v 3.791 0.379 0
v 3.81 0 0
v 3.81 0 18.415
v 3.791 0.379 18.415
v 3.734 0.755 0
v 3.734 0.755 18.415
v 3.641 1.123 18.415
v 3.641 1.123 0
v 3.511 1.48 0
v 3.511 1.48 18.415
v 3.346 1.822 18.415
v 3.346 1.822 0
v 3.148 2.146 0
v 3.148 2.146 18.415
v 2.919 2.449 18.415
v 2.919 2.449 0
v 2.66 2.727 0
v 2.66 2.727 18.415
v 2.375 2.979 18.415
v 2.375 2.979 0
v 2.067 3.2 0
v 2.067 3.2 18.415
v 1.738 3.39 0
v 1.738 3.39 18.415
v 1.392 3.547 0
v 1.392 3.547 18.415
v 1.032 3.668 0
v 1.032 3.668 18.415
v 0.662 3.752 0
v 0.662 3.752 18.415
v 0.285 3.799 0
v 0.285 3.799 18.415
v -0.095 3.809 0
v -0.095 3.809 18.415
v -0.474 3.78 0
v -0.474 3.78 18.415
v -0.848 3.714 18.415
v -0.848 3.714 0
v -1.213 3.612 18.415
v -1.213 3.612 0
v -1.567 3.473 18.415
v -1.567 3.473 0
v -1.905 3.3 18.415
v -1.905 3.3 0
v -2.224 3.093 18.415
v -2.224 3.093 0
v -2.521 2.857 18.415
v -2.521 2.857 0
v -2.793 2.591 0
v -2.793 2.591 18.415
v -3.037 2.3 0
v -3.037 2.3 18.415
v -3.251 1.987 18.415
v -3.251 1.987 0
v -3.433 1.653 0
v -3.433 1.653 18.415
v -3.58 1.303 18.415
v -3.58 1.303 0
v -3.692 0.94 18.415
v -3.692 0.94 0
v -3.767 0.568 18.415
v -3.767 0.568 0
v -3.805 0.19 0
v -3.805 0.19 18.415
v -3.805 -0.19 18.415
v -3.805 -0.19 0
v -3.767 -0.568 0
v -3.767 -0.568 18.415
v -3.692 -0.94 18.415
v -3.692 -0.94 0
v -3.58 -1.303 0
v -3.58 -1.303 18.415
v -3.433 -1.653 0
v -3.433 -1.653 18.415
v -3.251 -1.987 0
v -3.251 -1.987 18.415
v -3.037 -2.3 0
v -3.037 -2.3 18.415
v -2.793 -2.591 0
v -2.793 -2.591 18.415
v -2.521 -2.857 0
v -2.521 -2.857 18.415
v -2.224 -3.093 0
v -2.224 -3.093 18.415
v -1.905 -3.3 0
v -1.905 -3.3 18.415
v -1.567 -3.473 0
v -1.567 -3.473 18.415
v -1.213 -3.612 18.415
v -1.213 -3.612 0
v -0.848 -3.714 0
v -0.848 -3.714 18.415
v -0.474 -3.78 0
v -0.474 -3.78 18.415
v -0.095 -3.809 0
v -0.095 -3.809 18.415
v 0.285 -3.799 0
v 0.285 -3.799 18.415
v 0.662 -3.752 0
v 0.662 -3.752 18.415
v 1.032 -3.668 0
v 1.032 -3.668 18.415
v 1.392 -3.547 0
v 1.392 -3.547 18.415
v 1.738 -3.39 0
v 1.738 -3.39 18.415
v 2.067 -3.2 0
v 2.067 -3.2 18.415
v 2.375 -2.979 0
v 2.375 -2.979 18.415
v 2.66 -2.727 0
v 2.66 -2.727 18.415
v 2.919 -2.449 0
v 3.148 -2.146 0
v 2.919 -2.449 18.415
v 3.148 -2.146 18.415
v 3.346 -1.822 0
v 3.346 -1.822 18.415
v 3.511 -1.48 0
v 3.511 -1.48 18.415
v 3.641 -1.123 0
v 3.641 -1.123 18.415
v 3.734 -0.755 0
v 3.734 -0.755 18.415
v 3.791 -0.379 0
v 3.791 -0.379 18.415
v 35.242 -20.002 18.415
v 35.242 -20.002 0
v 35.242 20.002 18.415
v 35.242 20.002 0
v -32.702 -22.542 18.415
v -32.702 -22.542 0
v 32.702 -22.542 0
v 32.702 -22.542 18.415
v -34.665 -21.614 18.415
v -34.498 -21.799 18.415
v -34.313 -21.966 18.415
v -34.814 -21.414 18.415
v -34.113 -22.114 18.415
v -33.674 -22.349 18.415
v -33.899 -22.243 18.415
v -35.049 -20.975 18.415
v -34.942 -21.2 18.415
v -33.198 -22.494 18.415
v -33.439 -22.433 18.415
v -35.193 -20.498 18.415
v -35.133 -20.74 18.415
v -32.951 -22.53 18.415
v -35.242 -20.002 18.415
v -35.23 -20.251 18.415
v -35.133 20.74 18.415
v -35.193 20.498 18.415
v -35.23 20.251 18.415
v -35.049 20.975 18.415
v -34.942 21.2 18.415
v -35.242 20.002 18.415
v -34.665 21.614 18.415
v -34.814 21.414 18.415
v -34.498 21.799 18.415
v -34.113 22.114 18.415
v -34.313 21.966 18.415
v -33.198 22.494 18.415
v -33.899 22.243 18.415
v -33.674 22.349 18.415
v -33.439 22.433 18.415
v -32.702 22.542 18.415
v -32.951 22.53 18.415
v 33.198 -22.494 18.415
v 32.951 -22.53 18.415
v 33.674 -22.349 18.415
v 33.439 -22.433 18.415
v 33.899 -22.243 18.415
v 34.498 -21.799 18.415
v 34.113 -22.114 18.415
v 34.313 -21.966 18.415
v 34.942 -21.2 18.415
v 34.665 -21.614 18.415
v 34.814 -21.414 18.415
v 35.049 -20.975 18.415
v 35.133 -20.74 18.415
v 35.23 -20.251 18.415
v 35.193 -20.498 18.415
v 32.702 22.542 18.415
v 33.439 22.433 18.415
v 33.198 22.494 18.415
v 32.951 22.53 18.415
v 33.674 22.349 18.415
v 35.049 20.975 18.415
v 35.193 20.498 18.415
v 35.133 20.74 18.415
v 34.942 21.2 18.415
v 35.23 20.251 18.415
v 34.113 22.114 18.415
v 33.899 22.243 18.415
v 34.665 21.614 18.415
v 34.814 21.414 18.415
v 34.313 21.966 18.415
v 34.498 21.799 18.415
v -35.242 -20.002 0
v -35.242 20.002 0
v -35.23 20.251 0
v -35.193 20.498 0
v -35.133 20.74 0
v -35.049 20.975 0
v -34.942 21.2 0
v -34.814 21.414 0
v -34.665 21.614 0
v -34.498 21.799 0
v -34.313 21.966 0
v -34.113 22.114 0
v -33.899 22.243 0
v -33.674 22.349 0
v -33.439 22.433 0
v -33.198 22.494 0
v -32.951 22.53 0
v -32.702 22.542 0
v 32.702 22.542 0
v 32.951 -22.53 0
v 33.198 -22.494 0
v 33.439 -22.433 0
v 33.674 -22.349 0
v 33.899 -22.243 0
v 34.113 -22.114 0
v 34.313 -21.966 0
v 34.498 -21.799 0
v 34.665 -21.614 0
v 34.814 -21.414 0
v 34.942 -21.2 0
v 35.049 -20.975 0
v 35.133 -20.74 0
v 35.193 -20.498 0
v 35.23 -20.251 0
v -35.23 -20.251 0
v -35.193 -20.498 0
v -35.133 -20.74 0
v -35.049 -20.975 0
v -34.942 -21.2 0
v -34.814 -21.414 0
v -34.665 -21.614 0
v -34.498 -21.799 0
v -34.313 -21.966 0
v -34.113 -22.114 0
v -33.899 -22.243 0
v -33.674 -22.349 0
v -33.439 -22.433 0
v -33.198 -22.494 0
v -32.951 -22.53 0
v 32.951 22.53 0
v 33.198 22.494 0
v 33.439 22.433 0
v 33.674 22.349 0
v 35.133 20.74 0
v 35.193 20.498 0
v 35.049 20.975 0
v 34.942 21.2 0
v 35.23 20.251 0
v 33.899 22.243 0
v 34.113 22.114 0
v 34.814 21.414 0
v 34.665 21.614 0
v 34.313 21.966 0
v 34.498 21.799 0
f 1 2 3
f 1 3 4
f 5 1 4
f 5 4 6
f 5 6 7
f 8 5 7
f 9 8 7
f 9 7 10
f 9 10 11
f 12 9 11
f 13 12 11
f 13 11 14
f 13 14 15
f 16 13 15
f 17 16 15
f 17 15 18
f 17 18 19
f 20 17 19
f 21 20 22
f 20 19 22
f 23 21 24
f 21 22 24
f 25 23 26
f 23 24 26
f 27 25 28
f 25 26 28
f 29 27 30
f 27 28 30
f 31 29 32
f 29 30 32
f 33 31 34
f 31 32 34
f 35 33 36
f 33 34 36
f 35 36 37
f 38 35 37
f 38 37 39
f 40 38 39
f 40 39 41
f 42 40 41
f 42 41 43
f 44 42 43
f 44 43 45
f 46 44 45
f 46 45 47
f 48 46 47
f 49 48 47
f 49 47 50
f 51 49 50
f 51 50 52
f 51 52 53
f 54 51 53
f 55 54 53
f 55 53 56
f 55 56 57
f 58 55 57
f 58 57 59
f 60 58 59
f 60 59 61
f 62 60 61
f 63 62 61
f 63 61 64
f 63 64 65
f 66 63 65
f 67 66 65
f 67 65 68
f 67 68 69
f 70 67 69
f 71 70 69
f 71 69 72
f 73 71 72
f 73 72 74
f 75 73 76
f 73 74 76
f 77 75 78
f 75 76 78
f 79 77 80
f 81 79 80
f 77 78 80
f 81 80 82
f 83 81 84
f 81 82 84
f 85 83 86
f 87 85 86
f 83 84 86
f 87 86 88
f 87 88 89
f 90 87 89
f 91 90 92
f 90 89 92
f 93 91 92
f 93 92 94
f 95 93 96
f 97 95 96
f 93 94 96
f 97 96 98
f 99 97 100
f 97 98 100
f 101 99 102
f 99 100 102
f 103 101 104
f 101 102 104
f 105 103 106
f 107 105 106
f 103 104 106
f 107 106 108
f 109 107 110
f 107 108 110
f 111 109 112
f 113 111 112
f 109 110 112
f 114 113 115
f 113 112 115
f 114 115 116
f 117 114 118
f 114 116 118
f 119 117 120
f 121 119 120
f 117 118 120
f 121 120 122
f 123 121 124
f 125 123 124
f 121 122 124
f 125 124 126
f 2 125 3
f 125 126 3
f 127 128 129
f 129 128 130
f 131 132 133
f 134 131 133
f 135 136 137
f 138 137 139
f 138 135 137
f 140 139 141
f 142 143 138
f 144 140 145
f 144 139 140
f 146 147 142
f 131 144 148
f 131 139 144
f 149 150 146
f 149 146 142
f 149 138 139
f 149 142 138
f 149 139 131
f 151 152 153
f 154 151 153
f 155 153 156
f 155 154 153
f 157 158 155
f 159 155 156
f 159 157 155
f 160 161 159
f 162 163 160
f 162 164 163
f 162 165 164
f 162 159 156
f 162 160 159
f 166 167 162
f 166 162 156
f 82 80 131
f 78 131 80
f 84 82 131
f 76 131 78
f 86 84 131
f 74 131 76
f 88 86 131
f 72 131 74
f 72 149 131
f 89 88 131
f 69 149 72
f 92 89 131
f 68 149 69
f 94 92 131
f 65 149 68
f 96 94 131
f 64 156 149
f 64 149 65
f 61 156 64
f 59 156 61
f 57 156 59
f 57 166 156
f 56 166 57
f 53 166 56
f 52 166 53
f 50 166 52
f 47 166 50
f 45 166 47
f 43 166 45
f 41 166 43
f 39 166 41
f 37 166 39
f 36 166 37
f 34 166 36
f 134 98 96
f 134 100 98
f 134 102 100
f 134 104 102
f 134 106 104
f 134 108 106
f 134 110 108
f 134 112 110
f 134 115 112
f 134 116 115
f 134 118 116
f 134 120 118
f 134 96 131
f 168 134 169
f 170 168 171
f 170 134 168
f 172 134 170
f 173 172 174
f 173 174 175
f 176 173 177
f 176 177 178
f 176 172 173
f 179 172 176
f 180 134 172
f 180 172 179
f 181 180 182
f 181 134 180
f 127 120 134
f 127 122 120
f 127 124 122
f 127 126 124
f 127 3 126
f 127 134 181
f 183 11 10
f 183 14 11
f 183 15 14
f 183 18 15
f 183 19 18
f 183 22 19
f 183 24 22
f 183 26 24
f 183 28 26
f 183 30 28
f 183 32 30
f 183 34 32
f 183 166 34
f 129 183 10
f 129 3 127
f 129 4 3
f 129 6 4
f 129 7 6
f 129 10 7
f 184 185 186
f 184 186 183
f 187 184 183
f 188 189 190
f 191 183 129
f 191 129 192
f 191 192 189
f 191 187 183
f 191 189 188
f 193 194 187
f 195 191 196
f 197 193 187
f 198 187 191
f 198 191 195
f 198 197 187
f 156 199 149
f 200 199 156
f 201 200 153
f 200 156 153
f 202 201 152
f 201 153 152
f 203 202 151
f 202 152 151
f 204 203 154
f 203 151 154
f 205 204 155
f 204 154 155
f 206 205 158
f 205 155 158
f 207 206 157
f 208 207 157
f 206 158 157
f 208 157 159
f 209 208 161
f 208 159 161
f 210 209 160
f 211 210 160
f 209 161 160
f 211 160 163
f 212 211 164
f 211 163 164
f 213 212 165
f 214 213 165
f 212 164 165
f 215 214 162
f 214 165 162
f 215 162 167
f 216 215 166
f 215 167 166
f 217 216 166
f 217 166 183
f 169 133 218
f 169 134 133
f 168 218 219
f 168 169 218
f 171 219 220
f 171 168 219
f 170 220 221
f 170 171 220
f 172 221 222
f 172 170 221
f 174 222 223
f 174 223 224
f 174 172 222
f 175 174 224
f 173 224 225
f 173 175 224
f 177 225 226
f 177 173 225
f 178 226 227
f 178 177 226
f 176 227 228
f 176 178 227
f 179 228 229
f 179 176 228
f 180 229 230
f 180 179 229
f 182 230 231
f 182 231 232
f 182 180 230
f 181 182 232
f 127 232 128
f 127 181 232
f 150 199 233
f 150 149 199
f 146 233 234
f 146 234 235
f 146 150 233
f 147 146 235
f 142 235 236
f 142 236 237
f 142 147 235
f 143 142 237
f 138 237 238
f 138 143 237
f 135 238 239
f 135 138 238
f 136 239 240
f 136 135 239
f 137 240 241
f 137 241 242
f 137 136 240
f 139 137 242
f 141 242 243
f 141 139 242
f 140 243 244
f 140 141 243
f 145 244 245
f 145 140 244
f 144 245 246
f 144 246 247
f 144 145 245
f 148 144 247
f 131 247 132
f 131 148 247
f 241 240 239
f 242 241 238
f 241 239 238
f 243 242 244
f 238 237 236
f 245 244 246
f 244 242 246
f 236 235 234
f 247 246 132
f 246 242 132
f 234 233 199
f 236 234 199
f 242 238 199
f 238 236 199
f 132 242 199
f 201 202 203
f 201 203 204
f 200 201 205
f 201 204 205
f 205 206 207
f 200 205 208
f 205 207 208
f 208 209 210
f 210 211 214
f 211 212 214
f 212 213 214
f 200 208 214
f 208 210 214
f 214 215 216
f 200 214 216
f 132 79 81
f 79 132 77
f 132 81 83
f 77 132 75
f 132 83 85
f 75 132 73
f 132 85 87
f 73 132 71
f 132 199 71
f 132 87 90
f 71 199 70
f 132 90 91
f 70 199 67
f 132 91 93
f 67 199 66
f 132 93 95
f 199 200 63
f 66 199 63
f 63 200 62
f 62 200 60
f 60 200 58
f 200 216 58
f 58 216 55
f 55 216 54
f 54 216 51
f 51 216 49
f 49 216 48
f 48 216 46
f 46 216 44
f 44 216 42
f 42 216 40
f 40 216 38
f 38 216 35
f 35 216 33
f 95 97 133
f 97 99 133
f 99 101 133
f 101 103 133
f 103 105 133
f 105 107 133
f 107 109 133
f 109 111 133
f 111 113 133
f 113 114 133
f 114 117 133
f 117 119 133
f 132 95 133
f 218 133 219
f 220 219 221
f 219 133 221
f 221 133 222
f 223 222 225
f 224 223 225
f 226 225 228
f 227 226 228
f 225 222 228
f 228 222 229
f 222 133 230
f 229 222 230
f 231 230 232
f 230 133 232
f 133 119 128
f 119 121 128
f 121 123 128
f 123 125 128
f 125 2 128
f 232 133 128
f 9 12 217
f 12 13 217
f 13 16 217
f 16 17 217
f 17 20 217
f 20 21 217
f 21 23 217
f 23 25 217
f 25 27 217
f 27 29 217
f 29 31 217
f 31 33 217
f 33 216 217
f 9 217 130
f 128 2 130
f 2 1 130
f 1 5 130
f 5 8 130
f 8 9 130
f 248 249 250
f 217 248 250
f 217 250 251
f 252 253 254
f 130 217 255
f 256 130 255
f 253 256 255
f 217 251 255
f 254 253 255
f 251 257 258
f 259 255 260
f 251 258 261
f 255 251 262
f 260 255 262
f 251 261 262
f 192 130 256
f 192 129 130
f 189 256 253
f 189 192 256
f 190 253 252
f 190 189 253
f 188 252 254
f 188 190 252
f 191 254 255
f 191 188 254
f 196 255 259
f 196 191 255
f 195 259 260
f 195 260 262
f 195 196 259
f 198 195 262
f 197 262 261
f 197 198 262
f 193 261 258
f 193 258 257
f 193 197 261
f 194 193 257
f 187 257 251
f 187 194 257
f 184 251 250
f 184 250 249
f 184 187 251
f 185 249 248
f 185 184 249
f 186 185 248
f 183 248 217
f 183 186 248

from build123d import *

# Parameters (mm, degrees)
SKETCH2_W           = 70.484
SKETCH2_H           = 45.085
BOSS_EXTRUDE1_DEPTH = 18.415
FILLET1_R           = 2.54
SKETCH3_R           = 3.81
CUT_EXTRUDE1_DEPTH  = 46.708588856


with BuildPart() as part:
    # Sketch2 → Boss-Extrude1 (new body)
    with BuildSketch(Plane.XY):
        Rectangle(SKETCH2_W, SKETCH2_H)
    extrude(amount=BOSS_EXTRUDE1_DEPTH)

    # Fillet1
    fillet1_edges = [part.edges().sort_by_distance(p)[0] for p in [
        (35.242, -22.5425, 9.2075),
        (-35.242, -22.5425, 9.2075),
        (-35.242, 22.5425, 9.2075),
        (35.242, 22.5425, 9.2075),
    ]]
    fillet(fillet1_edges, radius=FILLET1_R)

    # Sketch3 → Cut-Extrude1 (cut, through all)
    with BuildSketch(Plane.XY.offset(18.415)):
        Circle(SKETCH3_R)
    extrude(amount=-CUT_EXTRUDE1_DEPTH, mode=Mode.SUBTRACT)


solid = part.part
